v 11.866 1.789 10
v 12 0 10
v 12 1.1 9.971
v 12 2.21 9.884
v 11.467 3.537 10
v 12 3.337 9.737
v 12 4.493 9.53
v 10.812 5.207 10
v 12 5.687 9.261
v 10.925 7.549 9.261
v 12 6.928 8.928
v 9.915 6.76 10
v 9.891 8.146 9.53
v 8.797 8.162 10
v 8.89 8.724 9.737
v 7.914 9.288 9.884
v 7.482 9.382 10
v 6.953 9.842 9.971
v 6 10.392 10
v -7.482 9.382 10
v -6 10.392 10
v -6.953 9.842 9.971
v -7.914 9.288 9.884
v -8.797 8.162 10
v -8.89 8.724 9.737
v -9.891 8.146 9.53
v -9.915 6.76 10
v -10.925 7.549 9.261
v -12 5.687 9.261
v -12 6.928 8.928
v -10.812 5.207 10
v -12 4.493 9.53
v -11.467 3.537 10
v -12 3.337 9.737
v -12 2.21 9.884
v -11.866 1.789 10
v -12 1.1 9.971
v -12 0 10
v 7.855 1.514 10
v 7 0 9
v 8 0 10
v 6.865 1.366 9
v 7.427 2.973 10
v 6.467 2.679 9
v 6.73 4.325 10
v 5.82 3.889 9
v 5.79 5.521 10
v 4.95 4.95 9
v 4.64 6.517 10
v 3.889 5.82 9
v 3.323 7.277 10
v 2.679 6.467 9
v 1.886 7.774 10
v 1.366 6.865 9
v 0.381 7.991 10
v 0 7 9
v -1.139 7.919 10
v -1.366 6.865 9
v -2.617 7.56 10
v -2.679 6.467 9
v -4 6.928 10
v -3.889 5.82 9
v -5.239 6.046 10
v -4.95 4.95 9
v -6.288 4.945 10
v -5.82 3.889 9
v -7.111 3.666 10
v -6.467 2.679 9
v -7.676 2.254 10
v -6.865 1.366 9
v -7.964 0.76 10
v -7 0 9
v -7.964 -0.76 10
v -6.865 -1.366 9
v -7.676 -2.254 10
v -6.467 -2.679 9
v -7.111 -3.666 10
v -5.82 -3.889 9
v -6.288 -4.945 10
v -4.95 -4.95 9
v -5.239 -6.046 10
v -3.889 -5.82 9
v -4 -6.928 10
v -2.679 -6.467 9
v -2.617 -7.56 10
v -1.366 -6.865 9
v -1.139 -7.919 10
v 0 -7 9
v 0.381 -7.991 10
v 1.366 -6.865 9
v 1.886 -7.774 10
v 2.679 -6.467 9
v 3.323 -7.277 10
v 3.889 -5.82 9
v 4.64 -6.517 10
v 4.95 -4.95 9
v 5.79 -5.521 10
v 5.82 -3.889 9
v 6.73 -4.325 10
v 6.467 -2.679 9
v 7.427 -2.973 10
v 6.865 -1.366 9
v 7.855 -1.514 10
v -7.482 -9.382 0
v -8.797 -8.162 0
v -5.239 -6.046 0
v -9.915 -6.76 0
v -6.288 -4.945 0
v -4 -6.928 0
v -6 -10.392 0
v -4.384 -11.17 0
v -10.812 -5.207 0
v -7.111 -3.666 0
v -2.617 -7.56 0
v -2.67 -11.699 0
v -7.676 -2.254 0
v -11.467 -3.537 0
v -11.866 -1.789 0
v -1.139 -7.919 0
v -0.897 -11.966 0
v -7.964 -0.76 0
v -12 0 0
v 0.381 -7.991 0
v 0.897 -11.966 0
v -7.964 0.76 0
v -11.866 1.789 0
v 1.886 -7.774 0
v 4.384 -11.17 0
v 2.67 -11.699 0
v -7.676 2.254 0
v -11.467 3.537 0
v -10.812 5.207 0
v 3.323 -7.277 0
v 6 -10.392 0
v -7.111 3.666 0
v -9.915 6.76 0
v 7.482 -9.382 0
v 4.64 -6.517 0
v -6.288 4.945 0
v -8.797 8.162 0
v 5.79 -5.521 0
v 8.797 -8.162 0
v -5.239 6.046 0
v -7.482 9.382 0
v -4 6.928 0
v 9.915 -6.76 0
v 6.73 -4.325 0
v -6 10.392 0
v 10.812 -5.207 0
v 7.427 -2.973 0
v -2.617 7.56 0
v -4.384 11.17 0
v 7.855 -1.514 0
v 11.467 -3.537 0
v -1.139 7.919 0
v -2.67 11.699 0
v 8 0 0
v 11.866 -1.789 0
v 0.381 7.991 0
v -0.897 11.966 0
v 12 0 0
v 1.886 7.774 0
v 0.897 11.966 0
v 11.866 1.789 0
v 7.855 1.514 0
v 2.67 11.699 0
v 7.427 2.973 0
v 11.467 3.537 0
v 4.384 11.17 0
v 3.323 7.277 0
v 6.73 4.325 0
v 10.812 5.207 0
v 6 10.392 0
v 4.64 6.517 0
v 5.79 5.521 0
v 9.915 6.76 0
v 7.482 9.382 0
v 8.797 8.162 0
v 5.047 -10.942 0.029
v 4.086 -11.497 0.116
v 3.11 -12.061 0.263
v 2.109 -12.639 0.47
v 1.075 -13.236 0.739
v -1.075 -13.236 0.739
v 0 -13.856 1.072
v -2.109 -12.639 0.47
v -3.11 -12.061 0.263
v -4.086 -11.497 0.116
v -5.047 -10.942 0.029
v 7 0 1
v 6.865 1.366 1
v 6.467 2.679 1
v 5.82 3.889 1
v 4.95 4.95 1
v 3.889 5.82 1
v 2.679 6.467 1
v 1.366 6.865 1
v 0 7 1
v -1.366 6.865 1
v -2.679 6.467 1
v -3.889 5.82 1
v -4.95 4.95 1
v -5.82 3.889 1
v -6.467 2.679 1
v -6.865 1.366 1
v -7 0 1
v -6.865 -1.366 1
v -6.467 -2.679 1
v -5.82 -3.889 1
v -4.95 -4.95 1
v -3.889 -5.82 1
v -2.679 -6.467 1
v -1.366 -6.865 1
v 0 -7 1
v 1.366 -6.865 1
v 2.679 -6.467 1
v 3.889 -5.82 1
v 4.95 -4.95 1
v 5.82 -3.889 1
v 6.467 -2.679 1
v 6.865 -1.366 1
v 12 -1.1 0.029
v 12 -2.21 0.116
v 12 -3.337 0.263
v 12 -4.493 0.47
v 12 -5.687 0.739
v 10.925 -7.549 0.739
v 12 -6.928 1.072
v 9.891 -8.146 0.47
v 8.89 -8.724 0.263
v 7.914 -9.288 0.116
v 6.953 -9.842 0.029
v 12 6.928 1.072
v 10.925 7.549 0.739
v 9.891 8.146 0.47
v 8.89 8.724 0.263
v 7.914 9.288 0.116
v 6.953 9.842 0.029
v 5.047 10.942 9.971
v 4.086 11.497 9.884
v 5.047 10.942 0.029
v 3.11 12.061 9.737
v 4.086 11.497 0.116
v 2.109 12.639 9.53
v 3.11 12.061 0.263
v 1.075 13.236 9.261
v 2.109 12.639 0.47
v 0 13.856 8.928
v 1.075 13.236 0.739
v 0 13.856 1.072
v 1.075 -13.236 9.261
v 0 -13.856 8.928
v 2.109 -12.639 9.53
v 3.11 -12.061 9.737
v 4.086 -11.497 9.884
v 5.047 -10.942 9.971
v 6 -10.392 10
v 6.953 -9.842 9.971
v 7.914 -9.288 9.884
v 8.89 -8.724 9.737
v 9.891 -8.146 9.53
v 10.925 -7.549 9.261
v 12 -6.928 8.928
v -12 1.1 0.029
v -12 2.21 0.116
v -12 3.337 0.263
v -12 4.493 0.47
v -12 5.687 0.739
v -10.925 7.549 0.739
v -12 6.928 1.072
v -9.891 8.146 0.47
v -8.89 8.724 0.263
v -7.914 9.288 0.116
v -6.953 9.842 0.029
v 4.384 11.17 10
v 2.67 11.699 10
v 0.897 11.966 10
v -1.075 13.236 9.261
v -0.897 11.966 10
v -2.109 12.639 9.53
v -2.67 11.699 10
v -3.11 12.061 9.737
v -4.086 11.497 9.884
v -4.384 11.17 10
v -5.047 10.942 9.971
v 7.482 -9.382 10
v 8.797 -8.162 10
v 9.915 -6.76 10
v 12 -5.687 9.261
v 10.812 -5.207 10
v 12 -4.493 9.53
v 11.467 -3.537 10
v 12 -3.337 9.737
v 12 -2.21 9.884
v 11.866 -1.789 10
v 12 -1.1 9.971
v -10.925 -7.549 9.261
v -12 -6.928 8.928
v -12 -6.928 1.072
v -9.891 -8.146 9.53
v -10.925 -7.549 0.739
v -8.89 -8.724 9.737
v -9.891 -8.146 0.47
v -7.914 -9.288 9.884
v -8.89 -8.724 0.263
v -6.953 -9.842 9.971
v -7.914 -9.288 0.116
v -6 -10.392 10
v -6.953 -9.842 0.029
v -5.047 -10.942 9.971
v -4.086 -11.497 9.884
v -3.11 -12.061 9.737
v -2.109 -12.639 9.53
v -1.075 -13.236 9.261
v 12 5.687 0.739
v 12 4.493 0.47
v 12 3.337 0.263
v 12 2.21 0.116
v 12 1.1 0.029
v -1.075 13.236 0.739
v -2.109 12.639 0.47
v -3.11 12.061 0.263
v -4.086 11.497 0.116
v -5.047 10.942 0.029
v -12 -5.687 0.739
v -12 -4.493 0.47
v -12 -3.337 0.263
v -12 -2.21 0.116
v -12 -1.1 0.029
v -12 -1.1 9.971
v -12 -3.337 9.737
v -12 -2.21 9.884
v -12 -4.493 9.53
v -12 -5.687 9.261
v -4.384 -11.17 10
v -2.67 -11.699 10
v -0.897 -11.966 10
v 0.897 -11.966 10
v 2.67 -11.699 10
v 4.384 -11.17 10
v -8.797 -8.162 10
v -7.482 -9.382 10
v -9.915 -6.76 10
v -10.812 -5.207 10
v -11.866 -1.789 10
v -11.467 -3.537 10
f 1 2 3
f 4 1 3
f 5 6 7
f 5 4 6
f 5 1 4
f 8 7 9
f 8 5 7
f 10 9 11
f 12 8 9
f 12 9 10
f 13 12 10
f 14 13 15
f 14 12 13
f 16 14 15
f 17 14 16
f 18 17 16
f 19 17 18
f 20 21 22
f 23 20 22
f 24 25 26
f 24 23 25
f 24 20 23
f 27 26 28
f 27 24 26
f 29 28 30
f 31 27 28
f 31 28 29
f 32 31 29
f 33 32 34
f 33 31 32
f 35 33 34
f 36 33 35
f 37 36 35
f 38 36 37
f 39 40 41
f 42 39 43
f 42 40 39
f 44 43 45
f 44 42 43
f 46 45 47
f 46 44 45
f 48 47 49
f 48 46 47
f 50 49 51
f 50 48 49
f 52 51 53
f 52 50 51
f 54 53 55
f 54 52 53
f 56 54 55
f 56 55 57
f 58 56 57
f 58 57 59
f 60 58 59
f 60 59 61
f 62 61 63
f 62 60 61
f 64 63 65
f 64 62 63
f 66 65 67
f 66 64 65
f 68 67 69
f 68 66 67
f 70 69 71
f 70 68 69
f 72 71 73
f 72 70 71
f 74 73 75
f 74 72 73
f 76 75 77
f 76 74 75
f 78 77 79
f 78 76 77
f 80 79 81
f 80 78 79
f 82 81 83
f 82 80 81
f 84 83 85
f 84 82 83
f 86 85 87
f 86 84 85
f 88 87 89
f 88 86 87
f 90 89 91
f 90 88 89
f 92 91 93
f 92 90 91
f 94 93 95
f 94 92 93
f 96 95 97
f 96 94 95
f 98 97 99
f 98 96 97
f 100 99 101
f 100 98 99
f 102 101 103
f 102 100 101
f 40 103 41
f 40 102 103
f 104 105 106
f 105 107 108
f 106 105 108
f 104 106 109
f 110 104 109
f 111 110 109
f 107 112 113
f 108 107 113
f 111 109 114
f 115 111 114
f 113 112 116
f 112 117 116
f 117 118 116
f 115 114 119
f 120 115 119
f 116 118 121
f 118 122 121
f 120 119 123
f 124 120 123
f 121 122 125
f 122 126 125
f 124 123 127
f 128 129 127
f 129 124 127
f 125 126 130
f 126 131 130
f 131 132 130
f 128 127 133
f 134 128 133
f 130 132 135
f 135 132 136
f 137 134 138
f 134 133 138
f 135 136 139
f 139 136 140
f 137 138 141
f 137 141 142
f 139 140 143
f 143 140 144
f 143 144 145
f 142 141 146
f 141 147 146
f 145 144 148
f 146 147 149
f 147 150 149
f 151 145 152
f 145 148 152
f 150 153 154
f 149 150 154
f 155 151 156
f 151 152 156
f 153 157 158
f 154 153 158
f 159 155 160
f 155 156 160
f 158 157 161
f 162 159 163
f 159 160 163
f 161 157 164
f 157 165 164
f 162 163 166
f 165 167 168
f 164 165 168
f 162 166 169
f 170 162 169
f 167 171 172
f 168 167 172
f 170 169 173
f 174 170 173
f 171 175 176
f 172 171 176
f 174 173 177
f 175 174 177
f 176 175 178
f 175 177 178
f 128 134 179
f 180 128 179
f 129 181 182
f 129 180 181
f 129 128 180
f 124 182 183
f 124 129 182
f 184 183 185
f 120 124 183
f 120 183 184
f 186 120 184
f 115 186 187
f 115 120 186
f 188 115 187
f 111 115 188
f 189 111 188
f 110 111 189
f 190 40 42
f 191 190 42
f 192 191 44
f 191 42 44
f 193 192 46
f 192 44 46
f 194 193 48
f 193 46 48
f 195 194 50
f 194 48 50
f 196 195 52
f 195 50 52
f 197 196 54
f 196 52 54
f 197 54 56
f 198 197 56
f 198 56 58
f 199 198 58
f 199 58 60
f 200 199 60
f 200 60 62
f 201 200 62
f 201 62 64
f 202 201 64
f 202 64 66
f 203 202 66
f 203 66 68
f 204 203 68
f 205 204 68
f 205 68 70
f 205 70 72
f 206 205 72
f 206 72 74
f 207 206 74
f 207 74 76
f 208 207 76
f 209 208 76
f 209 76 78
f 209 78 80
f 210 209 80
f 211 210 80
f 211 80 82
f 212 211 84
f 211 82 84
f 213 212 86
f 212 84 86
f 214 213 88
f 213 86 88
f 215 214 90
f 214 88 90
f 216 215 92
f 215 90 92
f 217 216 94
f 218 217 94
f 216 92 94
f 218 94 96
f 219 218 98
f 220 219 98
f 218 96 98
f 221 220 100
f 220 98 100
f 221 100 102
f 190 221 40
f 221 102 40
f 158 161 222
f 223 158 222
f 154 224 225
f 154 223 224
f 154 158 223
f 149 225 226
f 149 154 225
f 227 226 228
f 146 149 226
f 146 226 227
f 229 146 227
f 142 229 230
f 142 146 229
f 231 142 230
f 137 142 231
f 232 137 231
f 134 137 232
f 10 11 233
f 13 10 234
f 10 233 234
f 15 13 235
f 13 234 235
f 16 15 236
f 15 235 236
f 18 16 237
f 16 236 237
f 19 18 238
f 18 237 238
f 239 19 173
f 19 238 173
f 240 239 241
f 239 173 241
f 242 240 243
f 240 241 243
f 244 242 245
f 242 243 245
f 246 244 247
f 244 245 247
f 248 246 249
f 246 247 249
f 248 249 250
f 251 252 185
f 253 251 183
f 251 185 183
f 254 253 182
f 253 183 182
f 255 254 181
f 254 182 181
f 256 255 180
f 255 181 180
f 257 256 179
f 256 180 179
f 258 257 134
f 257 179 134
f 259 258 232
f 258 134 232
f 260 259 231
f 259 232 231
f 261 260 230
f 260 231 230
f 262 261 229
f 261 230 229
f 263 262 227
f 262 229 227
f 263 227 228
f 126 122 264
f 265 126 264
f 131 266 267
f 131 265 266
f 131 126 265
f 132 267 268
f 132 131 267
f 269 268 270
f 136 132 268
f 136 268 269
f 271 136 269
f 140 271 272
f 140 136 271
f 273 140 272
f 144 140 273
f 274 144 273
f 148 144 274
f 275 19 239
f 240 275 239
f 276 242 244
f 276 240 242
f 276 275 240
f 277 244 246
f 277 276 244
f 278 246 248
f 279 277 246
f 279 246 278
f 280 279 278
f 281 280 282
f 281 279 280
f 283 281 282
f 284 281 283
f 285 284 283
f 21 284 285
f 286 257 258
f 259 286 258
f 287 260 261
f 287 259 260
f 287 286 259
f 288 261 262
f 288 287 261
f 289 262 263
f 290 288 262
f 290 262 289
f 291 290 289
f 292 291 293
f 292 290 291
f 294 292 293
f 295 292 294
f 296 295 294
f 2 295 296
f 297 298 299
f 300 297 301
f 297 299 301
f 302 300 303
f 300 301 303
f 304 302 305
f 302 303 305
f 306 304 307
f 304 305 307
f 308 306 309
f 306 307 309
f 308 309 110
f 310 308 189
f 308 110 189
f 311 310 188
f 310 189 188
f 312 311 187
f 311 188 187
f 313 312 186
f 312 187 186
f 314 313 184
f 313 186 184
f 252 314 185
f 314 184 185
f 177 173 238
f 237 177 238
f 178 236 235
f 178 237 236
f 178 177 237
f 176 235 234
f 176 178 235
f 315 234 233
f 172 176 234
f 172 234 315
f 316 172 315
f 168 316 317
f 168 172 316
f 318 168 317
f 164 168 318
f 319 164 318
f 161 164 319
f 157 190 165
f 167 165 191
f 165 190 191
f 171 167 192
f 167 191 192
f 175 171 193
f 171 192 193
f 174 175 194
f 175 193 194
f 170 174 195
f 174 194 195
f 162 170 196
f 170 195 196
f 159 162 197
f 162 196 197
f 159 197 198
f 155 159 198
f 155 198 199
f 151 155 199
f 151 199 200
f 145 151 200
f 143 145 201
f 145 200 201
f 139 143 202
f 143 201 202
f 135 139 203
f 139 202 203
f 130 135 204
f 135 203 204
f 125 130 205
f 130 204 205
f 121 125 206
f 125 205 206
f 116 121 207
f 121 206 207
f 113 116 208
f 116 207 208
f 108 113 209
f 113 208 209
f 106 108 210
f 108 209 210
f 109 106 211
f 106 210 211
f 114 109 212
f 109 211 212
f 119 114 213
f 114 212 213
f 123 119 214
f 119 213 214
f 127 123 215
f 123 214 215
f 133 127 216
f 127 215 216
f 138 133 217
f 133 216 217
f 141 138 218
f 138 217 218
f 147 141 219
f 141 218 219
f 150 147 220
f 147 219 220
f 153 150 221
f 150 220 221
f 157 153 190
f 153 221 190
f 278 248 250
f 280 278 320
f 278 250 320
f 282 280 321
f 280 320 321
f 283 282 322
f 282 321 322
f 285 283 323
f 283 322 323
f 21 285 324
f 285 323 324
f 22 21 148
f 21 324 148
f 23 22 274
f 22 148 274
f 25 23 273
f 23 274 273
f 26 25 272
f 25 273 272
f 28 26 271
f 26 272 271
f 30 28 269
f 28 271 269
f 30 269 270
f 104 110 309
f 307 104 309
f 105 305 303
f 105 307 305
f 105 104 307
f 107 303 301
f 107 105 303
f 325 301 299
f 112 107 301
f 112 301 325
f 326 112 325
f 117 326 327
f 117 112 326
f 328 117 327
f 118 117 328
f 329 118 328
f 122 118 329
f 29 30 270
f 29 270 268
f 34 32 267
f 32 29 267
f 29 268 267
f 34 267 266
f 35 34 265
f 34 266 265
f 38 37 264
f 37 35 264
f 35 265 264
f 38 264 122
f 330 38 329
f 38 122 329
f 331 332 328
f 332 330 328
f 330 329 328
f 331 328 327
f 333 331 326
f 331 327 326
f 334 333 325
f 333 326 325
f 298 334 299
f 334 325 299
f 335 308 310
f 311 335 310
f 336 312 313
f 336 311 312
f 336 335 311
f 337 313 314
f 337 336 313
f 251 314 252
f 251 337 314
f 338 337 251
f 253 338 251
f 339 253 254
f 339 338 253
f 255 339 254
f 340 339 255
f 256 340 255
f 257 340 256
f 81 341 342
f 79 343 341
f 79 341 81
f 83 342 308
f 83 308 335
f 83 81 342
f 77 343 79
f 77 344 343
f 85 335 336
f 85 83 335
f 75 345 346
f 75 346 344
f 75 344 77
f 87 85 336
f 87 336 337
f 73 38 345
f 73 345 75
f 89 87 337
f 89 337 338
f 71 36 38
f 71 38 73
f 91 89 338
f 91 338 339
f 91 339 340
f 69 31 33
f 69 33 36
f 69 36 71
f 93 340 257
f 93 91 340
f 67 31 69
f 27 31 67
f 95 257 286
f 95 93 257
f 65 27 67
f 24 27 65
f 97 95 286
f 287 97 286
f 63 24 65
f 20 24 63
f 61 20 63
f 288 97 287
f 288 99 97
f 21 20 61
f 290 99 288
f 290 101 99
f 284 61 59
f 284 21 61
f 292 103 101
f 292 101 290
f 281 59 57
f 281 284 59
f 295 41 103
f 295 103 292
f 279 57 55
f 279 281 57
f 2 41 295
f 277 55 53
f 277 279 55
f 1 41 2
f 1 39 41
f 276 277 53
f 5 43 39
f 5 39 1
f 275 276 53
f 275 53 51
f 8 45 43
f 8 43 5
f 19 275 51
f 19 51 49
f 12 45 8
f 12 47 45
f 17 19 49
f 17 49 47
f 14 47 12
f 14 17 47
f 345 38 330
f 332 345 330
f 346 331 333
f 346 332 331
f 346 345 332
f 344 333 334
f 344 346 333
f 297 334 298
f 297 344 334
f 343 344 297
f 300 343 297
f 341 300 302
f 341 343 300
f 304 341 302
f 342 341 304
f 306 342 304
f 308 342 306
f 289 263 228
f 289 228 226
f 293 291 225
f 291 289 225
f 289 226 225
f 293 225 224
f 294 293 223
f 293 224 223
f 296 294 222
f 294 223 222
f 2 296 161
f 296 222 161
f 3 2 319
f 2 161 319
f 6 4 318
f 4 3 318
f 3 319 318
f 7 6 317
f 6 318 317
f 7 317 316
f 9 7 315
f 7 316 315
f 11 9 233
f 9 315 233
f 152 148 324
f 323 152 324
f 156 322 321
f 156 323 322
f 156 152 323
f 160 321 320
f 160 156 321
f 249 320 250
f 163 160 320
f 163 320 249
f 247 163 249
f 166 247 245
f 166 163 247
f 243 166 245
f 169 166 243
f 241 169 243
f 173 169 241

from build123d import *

# Parameters (mm, degrees)
BOSS_EXTRUDE2_DEPTH = 10
SKETCH2_R           = 7
CUT_EXTRUDE1_DEPTH  = 21.880613018
SKETCH3_OUTSIDE_W   = 68.242
SKETCH3_OUTSIDE_H   = 71.954
SKETCH3_OUTSIDE_R   = 12
CUT_EXTRUDE2_DEPTH  = 10
CUT_EXTRUDE2_DRAFT  = -60
SKETCH4_OUTSIDE_W   = 68.242
SKETCH4_OUTSIDE_H   = 71.954
SKETCH4_OUTSIDE_R   = 12
CUT_EXTRUDE3_DEPTH  = 10
CUT_EXTRUDE3_DRAFT  = -60
CHAMFER1_SIZE       = 1


with BuildPart() as part:
    # Sketch1 → Boss-Extrude2 (new body)
    with BuildSketch(Plane.XY):
        Polygon((12, -6.92820323), (12, 6.92820323), (0, 13.856406461), (-12, 6.92820323), (-12, -6.92820323), (0, -13.856406461), align=None)
    extrude(amount=BOSS_EXTRUDE2_DEPTH)

    # Sketch2 → Cut-Extrude1 (cut, through all)
    with BuildSketch(Plane.XY.offset(10)):
        Circle(SKETCH2_R)
    extrude(amount=-CUT_EXTRUDE1_DEPTH, mode=Mode.SUBTRACT)


with BuildPart() as cut_extrude2_tool:
    # Sketch3 outside → Cut-Extrude2 (with draft: the straight prism first)
    with BuildSketch(Plane.XY.offset(10)):
        Rectangle(SKETCH3_OUTSIDE_W, SKETCH3_OUTSIDE_H)
        Circle(SKETCH3_OUTSIDE_R, mode=Mode.SUBTRACT)
    extrude(amount=-CUT_EXTRUDE2_DEPTH)
    # Cut-Extrude2: the draft: its side faces are tilted about the plane it starts from
    cut_extrude2_sides = [cut_extrude2_tool.faces().sort_by_distance(p)[0] for p in [
        (0, -35.977, 5),
        (34.121, 0, 5),
        (0, 35.977, 5),
        (-34.121, 0, 5),
        (-12, 0, 5),
    ]]
    draft(cut_extrude2_sides, Plane.XY.offset(10), CUT_EXTRUDE2_DRAFT)


with BuildPart() as part_1:
    add(part.part)

    # Cut-Extrude2: cut by cut_extrude2_tool
    add(cut_extrude2_tool.part, mode=Mode.SUBTRACT)


with BuildPart() as cut_extrude3_tool:
    # Sketch4 outside → Cut-Extrude3 (with draft: the straight prism first)
    with BuildSketch(Plane(origin=(0, 0, 0), x_dir=(-1, 0, 0), z_dir=(0, 0, -1))):
        Rectangle(SKETCH4_OUTSIDE_W, SKETCH4_OUTSIDE_H)
        Circle(SKETCH4_OUTSIDE_R, mode=Mode.SUBTRACT)
    extrude(amount=-CUT_EXTRUDE3_DEPTH)
    # Cut-Extrude3: the draft: its side faces are tilted about the plane it starts from
    cut_extrude3_sides = [cut_extrude3_tool.faces().sort_by_distance(p)[0] for p in [
        (0, -35.977, 5),
        (-34.121, 0, 5),
        (0, 35.977, 5),
        (34.121, 0, 5),
        (12, 0, 5),
    ]]
    draft(cut_extrude3_sides, Plane(origin=(0, 0, 0), x_dir=(-1, 0, 0), z_dir=(0, 0, -1)), CUT_EXTRUDE3_DRAFT)


with BuildPart() as part_2:
    add(part_1.part)

    # Cut-Extrude3: cut by cut_extrude3_tool
    add(cut_extrude3_tool.part, mode=Mode.SUBTRACT)

    # Chamfer1
    chamfer1_edges = [part_2.edges().sort_by_distance(p)[0] for p in [
        (-7, 0, 0),
        (-7, 0, 10),
    ]]
    chamfer(chamfer1_edges, length=CHAMFER1_SIZE)


solid = part_2.part
